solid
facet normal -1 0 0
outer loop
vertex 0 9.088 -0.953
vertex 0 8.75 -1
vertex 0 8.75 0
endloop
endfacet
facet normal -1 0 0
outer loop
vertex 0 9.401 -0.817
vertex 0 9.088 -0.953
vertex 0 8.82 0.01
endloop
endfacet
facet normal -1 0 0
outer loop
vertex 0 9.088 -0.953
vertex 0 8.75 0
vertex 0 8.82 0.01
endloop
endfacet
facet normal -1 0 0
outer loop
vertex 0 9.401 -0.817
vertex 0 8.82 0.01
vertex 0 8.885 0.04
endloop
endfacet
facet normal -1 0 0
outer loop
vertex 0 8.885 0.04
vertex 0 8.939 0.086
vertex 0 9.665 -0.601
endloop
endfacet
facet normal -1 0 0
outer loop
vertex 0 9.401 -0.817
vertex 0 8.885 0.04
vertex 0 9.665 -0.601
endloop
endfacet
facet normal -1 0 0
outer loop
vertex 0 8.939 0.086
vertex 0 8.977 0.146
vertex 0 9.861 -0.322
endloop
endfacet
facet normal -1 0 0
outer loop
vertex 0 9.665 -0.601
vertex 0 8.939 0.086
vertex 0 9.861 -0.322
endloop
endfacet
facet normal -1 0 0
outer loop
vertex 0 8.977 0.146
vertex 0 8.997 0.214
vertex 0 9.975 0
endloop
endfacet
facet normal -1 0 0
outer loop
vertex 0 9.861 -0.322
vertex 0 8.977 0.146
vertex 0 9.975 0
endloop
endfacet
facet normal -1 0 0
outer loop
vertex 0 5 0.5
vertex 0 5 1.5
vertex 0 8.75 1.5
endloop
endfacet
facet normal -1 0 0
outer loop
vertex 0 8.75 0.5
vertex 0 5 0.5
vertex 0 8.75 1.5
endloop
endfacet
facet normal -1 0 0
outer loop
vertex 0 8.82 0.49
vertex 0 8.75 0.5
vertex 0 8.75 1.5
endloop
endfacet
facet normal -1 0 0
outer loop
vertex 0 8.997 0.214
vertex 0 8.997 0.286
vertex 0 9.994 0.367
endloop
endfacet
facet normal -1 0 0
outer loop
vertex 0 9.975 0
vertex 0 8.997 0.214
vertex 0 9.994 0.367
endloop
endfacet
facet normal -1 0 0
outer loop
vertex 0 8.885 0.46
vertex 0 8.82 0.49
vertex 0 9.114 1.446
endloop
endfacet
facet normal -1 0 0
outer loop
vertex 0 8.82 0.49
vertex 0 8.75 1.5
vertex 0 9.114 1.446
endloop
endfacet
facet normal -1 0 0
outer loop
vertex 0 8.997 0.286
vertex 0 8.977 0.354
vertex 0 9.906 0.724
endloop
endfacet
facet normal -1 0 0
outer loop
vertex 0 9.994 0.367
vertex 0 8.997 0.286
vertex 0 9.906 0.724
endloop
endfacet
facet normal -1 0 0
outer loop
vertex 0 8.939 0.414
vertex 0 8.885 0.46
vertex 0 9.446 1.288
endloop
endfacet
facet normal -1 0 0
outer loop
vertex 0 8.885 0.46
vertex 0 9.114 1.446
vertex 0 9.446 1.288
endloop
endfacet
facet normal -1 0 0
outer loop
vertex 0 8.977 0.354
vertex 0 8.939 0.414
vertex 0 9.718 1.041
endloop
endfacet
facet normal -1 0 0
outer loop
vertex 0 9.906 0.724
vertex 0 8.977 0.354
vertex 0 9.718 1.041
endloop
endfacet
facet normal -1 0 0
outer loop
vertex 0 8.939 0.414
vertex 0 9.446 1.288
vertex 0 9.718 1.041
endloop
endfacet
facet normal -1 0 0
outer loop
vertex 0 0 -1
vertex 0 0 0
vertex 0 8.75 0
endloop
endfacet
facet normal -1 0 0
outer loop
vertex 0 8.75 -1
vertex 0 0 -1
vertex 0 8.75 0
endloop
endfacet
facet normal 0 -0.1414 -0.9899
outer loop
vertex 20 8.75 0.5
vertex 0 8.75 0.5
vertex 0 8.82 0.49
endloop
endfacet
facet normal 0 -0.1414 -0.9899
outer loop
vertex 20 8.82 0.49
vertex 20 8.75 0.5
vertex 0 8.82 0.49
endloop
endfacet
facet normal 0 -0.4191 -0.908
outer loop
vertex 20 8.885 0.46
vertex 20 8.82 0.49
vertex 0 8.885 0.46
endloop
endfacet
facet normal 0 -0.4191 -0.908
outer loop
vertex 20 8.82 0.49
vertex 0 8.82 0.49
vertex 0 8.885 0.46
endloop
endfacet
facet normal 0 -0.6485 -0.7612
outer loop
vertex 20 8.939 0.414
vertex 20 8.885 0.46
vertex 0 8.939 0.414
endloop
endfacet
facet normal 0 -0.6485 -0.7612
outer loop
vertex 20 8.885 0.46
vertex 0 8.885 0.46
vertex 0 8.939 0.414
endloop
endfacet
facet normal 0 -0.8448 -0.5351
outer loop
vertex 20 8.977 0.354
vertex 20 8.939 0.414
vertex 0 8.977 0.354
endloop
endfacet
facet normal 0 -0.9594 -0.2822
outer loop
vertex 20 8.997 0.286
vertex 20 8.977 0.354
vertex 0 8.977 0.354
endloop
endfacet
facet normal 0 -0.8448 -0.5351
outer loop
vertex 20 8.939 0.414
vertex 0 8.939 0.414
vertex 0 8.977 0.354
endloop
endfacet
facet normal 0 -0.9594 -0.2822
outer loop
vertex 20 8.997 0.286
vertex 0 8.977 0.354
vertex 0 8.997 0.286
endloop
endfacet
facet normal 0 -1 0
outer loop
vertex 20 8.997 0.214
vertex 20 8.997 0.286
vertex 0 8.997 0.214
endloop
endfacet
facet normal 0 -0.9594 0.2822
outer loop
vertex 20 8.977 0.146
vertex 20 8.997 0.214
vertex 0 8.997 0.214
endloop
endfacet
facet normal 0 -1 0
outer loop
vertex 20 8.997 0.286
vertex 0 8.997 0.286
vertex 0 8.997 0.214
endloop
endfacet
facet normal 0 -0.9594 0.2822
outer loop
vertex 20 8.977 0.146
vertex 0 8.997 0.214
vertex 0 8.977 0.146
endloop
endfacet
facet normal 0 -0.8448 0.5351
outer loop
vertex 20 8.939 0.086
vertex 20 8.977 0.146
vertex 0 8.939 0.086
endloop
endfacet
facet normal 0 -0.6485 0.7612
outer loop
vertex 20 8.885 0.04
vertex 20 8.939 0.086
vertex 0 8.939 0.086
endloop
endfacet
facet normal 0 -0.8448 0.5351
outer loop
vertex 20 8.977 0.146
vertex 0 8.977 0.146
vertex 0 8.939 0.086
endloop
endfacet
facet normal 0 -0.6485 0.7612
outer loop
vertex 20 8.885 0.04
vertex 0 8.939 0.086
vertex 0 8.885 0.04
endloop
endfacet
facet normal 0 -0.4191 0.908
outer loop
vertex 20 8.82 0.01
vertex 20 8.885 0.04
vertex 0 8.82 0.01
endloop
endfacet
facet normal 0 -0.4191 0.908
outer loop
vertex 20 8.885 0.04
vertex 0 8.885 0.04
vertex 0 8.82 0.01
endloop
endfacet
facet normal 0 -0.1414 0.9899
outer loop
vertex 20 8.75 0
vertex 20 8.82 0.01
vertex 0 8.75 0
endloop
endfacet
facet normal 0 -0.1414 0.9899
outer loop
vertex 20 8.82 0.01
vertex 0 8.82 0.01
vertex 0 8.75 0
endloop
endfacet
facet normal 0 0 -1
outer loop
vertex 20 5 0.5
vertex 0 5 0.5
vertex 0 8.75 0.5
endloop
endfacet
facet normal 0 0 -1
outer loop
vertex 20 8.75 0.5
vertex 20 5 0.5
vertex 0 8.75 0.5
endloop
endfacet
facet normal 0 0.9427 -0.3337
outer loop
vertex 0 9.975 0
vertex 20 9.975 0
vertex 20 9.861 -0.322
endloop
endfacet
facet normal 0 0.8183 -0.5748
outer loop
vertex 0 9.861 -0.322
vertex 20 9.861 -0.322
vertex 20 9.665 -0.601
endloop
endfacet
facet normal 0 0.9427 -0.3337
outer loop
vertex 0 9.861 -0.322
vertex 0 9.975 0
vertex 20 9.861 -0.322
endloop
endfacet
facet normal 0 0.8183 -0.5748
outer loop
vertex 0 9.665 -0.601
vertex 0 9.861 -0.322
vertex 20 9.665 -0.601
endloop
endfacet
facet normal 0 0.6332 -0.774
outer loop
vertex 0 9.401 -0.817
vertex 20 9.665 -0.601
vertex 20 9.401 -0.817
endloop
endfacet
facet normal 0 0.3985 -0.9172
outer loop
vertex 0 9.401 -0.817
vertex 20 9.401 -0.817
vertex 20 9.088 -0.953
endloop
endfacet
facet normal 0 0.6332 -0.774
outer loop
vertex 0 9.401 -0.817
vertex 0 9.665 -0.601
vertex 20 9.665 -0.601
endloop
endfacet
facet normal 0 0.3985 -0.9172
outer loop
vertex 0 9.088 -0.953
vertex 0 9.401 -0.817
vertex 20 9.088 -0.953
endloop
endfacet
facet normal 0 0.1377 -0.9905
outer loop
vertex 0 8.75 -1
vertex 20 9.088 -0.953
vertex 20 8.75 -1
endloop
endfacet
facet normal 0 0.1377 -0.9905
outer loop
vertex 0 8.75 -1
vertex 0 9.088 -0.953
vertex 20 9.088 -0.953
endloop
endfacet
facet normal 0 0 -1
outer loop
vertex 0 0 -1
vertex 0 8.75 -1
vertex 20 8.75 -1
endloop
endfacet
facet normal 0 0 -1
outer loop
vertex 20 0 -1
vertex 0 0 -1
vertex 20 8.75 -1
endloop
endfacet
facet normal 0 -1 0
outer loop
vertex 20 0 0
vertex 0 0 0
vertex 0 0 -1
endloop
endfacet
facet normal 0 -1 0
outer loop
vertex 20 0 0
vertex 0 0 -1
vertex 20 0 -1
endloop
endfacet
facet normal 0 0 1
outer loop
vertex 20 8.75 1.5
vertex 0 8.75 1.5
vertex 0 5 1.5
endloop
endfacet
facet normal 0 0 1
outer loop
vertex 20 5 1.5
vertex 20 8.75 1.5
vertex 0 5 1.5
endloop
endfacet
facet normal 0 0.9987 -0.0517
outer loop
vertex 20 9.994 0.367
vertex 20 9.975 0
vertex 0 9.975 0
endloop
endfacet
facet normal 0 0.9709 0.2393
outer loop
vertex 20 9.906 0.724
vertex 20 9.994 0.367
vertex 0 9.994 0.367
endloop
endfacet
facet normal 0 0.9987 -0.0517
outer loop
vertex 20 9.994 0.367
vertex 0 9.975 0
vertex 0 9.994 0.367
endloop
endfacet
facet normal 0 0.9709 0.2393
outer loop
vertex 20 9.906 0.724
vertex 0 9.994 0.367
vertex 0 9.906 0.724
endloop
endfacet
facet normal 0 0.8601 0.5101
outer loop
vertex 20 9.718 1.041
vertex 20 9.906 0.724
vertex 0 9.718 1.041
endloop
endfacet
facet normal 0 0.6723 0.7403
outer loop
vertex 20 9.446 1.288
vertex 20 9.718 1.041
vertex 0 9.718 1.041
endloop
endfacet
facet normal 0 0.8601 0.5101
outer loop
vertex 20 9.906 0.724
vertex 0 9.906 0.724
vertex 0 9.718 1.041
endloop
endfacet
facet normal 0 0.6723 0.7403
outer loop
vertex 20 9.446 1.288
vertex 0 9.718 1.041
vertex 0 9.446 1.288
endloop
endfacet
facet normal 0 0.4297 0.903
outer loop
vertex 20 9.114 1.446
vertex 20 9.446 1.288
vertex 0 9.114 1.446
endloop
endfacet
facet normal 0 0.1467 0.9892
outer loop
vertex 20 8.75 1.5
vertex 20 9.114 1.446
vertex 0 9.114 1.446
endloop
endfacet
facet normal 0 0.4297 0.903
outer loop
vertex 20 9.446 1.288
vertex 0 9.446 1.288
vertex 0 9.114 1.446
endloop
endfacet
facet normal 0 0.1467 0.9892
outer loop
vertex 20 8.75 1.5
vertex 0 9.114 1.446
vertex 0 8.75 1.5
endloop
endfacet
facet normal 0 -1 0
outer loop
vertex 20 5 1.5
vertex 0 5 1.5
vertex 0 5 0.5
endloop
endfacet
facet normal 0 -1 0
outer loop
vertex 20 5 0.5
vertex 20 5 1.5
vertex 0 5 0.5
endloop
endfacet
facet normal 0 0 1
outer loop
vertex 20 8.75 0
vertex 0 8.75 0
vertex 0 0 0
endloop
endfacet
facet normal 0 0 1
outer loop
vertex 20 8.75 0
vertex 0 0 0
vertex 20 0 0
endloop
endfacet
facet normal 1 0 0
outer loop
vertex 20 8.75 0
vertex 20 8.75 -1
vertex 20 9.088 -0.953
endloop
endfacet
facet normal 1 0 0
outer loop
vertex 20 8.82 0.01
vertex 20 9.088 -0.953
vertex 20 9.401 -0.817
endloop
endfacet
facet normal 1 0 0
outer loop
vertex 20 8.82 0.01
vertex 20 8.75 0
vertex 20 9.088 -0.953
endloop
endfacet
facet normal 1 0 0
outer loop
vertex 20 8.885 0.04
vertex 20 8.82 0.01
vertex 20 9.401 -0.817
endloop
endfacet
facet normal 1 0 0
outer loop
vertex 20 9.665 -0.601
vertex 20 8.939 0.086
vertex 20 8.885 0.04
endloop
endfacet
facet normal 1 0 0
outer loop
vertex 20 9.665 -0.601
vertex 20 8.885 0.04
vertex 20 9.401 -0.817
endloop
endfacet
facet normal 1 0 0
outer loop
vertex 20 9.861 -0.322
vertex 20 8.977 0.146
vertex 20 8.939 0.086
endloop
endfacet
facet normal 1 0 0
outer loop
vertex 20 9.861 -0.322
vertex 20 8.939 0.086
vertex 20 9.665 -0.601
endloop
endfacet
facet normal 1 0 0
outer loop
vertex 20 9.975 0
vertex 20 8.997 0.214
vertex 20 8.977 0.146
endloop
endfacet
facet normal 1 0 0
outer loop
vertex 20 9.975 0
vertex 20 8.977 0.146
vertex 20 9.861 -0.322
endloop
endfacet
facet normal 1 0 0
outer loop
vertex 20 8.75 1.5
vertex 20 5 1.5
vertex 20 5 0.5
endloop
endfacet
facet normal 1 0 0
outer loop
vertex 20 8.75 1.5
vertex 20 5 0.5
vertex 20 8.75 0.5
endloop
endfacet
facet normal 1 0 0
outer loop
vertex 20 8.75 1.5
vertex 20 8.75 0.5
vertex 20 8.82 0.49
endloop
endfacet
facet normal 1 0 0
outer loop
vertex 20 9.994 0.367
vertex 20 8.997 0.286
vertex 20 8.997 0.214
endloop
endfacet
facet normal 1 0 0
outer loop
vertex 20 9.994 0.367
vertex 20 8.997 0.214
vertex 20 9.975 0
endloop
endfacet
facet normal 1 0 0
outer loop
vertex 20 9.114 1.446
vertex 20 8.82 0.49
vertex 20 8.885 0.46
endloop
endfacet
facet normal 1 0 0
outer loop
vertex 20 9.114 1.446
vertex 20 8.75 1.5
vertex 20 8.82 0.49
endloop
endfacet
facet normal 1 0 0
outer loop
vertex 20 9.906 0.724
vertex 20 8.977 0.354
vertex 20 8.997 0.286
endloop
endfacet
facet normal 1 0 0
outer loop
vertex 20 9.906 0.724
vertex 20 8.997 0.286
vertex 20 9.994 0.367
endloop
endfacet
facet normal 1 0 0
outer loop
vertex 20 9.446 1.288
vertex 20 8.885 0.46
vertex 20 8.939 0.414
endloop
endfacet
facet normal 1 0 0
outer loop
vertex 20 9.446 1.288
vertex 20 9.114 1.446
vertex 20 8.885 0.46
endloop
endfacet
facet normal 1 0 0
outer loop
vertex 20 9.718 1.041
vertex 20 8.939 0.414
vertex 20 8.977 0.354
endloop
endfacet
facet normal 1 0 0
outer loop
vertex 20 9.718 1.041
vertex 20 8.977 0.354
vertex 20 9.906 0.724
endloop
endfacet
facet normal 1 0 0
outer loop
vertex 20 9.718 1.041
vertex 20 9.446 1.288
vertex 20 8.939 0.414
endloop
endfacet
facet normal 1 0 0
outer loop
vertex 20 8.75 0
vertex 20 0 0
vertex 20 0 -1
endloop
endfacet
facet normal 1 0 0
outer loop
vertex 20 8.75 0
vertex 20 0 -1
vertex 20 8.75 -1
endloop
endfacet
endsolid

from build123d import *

# Parameters (mm, degrees)
SKETCH_1_W       = 20
SKETCH_1_H       = 10
BASEPLATE_DEPTH  = 1
HEM_OPEN_DEPTH   = 20
HEM_OPEN_2_DEPTH = 20


# Read off the part's stored shape, not the designer's step: Hem_open
# Sheet-metal steps are written as plain solids
with BuildPart() as part:
    # Sketch 1 → BasePlate (new body)
    with BuildSketch(Plane.XY):
        with Locations((10, 5)):
            Rectangle(SKETCH_1_W, SKETCH_1_H)
    extrude(amount=-BASEPLATE_DEPTH)

    # Hem_open outline → Hem_open (cut)
    with BuildSketch(Plane.YZ):
        with BuildLine():
            Line((10, 0), (9.974744871, 0))
            ThreePointArc((9.974744871, 0), (9.540569415, -0.718245837), (8.75, -1))
            Line((8.75, -1), (10, -1))
            Line((10, -1), (10, 0))
        make_face()
    extrude(amount=HEM_OPEN_DEPTH, mode=Mode.SUBTRACT)

    # Hem_open 2 outline → Hem_open 2 (add)
    with BuildSketch(Plane.YZ):
        with BuildLine():
            Line((5, 1.5), (5, 0.5))
            Line((5, 0.5), (8.75, 0.5))
            ThreePointArc((8.75, 0.5), (9, 0.25), (8.75, 0))
            Line((8.75, 0), (9.974744871, 0))
            ThreePointArc((9.974744871, 0), (9.718245837, 1.040569415), (8.75, 1.5))
            Line((8.75, 1.5), (5, 1.5))
        make_face()
    extrude(amount=HEM_OPEN_2_DEPTH)


solid = part.part
